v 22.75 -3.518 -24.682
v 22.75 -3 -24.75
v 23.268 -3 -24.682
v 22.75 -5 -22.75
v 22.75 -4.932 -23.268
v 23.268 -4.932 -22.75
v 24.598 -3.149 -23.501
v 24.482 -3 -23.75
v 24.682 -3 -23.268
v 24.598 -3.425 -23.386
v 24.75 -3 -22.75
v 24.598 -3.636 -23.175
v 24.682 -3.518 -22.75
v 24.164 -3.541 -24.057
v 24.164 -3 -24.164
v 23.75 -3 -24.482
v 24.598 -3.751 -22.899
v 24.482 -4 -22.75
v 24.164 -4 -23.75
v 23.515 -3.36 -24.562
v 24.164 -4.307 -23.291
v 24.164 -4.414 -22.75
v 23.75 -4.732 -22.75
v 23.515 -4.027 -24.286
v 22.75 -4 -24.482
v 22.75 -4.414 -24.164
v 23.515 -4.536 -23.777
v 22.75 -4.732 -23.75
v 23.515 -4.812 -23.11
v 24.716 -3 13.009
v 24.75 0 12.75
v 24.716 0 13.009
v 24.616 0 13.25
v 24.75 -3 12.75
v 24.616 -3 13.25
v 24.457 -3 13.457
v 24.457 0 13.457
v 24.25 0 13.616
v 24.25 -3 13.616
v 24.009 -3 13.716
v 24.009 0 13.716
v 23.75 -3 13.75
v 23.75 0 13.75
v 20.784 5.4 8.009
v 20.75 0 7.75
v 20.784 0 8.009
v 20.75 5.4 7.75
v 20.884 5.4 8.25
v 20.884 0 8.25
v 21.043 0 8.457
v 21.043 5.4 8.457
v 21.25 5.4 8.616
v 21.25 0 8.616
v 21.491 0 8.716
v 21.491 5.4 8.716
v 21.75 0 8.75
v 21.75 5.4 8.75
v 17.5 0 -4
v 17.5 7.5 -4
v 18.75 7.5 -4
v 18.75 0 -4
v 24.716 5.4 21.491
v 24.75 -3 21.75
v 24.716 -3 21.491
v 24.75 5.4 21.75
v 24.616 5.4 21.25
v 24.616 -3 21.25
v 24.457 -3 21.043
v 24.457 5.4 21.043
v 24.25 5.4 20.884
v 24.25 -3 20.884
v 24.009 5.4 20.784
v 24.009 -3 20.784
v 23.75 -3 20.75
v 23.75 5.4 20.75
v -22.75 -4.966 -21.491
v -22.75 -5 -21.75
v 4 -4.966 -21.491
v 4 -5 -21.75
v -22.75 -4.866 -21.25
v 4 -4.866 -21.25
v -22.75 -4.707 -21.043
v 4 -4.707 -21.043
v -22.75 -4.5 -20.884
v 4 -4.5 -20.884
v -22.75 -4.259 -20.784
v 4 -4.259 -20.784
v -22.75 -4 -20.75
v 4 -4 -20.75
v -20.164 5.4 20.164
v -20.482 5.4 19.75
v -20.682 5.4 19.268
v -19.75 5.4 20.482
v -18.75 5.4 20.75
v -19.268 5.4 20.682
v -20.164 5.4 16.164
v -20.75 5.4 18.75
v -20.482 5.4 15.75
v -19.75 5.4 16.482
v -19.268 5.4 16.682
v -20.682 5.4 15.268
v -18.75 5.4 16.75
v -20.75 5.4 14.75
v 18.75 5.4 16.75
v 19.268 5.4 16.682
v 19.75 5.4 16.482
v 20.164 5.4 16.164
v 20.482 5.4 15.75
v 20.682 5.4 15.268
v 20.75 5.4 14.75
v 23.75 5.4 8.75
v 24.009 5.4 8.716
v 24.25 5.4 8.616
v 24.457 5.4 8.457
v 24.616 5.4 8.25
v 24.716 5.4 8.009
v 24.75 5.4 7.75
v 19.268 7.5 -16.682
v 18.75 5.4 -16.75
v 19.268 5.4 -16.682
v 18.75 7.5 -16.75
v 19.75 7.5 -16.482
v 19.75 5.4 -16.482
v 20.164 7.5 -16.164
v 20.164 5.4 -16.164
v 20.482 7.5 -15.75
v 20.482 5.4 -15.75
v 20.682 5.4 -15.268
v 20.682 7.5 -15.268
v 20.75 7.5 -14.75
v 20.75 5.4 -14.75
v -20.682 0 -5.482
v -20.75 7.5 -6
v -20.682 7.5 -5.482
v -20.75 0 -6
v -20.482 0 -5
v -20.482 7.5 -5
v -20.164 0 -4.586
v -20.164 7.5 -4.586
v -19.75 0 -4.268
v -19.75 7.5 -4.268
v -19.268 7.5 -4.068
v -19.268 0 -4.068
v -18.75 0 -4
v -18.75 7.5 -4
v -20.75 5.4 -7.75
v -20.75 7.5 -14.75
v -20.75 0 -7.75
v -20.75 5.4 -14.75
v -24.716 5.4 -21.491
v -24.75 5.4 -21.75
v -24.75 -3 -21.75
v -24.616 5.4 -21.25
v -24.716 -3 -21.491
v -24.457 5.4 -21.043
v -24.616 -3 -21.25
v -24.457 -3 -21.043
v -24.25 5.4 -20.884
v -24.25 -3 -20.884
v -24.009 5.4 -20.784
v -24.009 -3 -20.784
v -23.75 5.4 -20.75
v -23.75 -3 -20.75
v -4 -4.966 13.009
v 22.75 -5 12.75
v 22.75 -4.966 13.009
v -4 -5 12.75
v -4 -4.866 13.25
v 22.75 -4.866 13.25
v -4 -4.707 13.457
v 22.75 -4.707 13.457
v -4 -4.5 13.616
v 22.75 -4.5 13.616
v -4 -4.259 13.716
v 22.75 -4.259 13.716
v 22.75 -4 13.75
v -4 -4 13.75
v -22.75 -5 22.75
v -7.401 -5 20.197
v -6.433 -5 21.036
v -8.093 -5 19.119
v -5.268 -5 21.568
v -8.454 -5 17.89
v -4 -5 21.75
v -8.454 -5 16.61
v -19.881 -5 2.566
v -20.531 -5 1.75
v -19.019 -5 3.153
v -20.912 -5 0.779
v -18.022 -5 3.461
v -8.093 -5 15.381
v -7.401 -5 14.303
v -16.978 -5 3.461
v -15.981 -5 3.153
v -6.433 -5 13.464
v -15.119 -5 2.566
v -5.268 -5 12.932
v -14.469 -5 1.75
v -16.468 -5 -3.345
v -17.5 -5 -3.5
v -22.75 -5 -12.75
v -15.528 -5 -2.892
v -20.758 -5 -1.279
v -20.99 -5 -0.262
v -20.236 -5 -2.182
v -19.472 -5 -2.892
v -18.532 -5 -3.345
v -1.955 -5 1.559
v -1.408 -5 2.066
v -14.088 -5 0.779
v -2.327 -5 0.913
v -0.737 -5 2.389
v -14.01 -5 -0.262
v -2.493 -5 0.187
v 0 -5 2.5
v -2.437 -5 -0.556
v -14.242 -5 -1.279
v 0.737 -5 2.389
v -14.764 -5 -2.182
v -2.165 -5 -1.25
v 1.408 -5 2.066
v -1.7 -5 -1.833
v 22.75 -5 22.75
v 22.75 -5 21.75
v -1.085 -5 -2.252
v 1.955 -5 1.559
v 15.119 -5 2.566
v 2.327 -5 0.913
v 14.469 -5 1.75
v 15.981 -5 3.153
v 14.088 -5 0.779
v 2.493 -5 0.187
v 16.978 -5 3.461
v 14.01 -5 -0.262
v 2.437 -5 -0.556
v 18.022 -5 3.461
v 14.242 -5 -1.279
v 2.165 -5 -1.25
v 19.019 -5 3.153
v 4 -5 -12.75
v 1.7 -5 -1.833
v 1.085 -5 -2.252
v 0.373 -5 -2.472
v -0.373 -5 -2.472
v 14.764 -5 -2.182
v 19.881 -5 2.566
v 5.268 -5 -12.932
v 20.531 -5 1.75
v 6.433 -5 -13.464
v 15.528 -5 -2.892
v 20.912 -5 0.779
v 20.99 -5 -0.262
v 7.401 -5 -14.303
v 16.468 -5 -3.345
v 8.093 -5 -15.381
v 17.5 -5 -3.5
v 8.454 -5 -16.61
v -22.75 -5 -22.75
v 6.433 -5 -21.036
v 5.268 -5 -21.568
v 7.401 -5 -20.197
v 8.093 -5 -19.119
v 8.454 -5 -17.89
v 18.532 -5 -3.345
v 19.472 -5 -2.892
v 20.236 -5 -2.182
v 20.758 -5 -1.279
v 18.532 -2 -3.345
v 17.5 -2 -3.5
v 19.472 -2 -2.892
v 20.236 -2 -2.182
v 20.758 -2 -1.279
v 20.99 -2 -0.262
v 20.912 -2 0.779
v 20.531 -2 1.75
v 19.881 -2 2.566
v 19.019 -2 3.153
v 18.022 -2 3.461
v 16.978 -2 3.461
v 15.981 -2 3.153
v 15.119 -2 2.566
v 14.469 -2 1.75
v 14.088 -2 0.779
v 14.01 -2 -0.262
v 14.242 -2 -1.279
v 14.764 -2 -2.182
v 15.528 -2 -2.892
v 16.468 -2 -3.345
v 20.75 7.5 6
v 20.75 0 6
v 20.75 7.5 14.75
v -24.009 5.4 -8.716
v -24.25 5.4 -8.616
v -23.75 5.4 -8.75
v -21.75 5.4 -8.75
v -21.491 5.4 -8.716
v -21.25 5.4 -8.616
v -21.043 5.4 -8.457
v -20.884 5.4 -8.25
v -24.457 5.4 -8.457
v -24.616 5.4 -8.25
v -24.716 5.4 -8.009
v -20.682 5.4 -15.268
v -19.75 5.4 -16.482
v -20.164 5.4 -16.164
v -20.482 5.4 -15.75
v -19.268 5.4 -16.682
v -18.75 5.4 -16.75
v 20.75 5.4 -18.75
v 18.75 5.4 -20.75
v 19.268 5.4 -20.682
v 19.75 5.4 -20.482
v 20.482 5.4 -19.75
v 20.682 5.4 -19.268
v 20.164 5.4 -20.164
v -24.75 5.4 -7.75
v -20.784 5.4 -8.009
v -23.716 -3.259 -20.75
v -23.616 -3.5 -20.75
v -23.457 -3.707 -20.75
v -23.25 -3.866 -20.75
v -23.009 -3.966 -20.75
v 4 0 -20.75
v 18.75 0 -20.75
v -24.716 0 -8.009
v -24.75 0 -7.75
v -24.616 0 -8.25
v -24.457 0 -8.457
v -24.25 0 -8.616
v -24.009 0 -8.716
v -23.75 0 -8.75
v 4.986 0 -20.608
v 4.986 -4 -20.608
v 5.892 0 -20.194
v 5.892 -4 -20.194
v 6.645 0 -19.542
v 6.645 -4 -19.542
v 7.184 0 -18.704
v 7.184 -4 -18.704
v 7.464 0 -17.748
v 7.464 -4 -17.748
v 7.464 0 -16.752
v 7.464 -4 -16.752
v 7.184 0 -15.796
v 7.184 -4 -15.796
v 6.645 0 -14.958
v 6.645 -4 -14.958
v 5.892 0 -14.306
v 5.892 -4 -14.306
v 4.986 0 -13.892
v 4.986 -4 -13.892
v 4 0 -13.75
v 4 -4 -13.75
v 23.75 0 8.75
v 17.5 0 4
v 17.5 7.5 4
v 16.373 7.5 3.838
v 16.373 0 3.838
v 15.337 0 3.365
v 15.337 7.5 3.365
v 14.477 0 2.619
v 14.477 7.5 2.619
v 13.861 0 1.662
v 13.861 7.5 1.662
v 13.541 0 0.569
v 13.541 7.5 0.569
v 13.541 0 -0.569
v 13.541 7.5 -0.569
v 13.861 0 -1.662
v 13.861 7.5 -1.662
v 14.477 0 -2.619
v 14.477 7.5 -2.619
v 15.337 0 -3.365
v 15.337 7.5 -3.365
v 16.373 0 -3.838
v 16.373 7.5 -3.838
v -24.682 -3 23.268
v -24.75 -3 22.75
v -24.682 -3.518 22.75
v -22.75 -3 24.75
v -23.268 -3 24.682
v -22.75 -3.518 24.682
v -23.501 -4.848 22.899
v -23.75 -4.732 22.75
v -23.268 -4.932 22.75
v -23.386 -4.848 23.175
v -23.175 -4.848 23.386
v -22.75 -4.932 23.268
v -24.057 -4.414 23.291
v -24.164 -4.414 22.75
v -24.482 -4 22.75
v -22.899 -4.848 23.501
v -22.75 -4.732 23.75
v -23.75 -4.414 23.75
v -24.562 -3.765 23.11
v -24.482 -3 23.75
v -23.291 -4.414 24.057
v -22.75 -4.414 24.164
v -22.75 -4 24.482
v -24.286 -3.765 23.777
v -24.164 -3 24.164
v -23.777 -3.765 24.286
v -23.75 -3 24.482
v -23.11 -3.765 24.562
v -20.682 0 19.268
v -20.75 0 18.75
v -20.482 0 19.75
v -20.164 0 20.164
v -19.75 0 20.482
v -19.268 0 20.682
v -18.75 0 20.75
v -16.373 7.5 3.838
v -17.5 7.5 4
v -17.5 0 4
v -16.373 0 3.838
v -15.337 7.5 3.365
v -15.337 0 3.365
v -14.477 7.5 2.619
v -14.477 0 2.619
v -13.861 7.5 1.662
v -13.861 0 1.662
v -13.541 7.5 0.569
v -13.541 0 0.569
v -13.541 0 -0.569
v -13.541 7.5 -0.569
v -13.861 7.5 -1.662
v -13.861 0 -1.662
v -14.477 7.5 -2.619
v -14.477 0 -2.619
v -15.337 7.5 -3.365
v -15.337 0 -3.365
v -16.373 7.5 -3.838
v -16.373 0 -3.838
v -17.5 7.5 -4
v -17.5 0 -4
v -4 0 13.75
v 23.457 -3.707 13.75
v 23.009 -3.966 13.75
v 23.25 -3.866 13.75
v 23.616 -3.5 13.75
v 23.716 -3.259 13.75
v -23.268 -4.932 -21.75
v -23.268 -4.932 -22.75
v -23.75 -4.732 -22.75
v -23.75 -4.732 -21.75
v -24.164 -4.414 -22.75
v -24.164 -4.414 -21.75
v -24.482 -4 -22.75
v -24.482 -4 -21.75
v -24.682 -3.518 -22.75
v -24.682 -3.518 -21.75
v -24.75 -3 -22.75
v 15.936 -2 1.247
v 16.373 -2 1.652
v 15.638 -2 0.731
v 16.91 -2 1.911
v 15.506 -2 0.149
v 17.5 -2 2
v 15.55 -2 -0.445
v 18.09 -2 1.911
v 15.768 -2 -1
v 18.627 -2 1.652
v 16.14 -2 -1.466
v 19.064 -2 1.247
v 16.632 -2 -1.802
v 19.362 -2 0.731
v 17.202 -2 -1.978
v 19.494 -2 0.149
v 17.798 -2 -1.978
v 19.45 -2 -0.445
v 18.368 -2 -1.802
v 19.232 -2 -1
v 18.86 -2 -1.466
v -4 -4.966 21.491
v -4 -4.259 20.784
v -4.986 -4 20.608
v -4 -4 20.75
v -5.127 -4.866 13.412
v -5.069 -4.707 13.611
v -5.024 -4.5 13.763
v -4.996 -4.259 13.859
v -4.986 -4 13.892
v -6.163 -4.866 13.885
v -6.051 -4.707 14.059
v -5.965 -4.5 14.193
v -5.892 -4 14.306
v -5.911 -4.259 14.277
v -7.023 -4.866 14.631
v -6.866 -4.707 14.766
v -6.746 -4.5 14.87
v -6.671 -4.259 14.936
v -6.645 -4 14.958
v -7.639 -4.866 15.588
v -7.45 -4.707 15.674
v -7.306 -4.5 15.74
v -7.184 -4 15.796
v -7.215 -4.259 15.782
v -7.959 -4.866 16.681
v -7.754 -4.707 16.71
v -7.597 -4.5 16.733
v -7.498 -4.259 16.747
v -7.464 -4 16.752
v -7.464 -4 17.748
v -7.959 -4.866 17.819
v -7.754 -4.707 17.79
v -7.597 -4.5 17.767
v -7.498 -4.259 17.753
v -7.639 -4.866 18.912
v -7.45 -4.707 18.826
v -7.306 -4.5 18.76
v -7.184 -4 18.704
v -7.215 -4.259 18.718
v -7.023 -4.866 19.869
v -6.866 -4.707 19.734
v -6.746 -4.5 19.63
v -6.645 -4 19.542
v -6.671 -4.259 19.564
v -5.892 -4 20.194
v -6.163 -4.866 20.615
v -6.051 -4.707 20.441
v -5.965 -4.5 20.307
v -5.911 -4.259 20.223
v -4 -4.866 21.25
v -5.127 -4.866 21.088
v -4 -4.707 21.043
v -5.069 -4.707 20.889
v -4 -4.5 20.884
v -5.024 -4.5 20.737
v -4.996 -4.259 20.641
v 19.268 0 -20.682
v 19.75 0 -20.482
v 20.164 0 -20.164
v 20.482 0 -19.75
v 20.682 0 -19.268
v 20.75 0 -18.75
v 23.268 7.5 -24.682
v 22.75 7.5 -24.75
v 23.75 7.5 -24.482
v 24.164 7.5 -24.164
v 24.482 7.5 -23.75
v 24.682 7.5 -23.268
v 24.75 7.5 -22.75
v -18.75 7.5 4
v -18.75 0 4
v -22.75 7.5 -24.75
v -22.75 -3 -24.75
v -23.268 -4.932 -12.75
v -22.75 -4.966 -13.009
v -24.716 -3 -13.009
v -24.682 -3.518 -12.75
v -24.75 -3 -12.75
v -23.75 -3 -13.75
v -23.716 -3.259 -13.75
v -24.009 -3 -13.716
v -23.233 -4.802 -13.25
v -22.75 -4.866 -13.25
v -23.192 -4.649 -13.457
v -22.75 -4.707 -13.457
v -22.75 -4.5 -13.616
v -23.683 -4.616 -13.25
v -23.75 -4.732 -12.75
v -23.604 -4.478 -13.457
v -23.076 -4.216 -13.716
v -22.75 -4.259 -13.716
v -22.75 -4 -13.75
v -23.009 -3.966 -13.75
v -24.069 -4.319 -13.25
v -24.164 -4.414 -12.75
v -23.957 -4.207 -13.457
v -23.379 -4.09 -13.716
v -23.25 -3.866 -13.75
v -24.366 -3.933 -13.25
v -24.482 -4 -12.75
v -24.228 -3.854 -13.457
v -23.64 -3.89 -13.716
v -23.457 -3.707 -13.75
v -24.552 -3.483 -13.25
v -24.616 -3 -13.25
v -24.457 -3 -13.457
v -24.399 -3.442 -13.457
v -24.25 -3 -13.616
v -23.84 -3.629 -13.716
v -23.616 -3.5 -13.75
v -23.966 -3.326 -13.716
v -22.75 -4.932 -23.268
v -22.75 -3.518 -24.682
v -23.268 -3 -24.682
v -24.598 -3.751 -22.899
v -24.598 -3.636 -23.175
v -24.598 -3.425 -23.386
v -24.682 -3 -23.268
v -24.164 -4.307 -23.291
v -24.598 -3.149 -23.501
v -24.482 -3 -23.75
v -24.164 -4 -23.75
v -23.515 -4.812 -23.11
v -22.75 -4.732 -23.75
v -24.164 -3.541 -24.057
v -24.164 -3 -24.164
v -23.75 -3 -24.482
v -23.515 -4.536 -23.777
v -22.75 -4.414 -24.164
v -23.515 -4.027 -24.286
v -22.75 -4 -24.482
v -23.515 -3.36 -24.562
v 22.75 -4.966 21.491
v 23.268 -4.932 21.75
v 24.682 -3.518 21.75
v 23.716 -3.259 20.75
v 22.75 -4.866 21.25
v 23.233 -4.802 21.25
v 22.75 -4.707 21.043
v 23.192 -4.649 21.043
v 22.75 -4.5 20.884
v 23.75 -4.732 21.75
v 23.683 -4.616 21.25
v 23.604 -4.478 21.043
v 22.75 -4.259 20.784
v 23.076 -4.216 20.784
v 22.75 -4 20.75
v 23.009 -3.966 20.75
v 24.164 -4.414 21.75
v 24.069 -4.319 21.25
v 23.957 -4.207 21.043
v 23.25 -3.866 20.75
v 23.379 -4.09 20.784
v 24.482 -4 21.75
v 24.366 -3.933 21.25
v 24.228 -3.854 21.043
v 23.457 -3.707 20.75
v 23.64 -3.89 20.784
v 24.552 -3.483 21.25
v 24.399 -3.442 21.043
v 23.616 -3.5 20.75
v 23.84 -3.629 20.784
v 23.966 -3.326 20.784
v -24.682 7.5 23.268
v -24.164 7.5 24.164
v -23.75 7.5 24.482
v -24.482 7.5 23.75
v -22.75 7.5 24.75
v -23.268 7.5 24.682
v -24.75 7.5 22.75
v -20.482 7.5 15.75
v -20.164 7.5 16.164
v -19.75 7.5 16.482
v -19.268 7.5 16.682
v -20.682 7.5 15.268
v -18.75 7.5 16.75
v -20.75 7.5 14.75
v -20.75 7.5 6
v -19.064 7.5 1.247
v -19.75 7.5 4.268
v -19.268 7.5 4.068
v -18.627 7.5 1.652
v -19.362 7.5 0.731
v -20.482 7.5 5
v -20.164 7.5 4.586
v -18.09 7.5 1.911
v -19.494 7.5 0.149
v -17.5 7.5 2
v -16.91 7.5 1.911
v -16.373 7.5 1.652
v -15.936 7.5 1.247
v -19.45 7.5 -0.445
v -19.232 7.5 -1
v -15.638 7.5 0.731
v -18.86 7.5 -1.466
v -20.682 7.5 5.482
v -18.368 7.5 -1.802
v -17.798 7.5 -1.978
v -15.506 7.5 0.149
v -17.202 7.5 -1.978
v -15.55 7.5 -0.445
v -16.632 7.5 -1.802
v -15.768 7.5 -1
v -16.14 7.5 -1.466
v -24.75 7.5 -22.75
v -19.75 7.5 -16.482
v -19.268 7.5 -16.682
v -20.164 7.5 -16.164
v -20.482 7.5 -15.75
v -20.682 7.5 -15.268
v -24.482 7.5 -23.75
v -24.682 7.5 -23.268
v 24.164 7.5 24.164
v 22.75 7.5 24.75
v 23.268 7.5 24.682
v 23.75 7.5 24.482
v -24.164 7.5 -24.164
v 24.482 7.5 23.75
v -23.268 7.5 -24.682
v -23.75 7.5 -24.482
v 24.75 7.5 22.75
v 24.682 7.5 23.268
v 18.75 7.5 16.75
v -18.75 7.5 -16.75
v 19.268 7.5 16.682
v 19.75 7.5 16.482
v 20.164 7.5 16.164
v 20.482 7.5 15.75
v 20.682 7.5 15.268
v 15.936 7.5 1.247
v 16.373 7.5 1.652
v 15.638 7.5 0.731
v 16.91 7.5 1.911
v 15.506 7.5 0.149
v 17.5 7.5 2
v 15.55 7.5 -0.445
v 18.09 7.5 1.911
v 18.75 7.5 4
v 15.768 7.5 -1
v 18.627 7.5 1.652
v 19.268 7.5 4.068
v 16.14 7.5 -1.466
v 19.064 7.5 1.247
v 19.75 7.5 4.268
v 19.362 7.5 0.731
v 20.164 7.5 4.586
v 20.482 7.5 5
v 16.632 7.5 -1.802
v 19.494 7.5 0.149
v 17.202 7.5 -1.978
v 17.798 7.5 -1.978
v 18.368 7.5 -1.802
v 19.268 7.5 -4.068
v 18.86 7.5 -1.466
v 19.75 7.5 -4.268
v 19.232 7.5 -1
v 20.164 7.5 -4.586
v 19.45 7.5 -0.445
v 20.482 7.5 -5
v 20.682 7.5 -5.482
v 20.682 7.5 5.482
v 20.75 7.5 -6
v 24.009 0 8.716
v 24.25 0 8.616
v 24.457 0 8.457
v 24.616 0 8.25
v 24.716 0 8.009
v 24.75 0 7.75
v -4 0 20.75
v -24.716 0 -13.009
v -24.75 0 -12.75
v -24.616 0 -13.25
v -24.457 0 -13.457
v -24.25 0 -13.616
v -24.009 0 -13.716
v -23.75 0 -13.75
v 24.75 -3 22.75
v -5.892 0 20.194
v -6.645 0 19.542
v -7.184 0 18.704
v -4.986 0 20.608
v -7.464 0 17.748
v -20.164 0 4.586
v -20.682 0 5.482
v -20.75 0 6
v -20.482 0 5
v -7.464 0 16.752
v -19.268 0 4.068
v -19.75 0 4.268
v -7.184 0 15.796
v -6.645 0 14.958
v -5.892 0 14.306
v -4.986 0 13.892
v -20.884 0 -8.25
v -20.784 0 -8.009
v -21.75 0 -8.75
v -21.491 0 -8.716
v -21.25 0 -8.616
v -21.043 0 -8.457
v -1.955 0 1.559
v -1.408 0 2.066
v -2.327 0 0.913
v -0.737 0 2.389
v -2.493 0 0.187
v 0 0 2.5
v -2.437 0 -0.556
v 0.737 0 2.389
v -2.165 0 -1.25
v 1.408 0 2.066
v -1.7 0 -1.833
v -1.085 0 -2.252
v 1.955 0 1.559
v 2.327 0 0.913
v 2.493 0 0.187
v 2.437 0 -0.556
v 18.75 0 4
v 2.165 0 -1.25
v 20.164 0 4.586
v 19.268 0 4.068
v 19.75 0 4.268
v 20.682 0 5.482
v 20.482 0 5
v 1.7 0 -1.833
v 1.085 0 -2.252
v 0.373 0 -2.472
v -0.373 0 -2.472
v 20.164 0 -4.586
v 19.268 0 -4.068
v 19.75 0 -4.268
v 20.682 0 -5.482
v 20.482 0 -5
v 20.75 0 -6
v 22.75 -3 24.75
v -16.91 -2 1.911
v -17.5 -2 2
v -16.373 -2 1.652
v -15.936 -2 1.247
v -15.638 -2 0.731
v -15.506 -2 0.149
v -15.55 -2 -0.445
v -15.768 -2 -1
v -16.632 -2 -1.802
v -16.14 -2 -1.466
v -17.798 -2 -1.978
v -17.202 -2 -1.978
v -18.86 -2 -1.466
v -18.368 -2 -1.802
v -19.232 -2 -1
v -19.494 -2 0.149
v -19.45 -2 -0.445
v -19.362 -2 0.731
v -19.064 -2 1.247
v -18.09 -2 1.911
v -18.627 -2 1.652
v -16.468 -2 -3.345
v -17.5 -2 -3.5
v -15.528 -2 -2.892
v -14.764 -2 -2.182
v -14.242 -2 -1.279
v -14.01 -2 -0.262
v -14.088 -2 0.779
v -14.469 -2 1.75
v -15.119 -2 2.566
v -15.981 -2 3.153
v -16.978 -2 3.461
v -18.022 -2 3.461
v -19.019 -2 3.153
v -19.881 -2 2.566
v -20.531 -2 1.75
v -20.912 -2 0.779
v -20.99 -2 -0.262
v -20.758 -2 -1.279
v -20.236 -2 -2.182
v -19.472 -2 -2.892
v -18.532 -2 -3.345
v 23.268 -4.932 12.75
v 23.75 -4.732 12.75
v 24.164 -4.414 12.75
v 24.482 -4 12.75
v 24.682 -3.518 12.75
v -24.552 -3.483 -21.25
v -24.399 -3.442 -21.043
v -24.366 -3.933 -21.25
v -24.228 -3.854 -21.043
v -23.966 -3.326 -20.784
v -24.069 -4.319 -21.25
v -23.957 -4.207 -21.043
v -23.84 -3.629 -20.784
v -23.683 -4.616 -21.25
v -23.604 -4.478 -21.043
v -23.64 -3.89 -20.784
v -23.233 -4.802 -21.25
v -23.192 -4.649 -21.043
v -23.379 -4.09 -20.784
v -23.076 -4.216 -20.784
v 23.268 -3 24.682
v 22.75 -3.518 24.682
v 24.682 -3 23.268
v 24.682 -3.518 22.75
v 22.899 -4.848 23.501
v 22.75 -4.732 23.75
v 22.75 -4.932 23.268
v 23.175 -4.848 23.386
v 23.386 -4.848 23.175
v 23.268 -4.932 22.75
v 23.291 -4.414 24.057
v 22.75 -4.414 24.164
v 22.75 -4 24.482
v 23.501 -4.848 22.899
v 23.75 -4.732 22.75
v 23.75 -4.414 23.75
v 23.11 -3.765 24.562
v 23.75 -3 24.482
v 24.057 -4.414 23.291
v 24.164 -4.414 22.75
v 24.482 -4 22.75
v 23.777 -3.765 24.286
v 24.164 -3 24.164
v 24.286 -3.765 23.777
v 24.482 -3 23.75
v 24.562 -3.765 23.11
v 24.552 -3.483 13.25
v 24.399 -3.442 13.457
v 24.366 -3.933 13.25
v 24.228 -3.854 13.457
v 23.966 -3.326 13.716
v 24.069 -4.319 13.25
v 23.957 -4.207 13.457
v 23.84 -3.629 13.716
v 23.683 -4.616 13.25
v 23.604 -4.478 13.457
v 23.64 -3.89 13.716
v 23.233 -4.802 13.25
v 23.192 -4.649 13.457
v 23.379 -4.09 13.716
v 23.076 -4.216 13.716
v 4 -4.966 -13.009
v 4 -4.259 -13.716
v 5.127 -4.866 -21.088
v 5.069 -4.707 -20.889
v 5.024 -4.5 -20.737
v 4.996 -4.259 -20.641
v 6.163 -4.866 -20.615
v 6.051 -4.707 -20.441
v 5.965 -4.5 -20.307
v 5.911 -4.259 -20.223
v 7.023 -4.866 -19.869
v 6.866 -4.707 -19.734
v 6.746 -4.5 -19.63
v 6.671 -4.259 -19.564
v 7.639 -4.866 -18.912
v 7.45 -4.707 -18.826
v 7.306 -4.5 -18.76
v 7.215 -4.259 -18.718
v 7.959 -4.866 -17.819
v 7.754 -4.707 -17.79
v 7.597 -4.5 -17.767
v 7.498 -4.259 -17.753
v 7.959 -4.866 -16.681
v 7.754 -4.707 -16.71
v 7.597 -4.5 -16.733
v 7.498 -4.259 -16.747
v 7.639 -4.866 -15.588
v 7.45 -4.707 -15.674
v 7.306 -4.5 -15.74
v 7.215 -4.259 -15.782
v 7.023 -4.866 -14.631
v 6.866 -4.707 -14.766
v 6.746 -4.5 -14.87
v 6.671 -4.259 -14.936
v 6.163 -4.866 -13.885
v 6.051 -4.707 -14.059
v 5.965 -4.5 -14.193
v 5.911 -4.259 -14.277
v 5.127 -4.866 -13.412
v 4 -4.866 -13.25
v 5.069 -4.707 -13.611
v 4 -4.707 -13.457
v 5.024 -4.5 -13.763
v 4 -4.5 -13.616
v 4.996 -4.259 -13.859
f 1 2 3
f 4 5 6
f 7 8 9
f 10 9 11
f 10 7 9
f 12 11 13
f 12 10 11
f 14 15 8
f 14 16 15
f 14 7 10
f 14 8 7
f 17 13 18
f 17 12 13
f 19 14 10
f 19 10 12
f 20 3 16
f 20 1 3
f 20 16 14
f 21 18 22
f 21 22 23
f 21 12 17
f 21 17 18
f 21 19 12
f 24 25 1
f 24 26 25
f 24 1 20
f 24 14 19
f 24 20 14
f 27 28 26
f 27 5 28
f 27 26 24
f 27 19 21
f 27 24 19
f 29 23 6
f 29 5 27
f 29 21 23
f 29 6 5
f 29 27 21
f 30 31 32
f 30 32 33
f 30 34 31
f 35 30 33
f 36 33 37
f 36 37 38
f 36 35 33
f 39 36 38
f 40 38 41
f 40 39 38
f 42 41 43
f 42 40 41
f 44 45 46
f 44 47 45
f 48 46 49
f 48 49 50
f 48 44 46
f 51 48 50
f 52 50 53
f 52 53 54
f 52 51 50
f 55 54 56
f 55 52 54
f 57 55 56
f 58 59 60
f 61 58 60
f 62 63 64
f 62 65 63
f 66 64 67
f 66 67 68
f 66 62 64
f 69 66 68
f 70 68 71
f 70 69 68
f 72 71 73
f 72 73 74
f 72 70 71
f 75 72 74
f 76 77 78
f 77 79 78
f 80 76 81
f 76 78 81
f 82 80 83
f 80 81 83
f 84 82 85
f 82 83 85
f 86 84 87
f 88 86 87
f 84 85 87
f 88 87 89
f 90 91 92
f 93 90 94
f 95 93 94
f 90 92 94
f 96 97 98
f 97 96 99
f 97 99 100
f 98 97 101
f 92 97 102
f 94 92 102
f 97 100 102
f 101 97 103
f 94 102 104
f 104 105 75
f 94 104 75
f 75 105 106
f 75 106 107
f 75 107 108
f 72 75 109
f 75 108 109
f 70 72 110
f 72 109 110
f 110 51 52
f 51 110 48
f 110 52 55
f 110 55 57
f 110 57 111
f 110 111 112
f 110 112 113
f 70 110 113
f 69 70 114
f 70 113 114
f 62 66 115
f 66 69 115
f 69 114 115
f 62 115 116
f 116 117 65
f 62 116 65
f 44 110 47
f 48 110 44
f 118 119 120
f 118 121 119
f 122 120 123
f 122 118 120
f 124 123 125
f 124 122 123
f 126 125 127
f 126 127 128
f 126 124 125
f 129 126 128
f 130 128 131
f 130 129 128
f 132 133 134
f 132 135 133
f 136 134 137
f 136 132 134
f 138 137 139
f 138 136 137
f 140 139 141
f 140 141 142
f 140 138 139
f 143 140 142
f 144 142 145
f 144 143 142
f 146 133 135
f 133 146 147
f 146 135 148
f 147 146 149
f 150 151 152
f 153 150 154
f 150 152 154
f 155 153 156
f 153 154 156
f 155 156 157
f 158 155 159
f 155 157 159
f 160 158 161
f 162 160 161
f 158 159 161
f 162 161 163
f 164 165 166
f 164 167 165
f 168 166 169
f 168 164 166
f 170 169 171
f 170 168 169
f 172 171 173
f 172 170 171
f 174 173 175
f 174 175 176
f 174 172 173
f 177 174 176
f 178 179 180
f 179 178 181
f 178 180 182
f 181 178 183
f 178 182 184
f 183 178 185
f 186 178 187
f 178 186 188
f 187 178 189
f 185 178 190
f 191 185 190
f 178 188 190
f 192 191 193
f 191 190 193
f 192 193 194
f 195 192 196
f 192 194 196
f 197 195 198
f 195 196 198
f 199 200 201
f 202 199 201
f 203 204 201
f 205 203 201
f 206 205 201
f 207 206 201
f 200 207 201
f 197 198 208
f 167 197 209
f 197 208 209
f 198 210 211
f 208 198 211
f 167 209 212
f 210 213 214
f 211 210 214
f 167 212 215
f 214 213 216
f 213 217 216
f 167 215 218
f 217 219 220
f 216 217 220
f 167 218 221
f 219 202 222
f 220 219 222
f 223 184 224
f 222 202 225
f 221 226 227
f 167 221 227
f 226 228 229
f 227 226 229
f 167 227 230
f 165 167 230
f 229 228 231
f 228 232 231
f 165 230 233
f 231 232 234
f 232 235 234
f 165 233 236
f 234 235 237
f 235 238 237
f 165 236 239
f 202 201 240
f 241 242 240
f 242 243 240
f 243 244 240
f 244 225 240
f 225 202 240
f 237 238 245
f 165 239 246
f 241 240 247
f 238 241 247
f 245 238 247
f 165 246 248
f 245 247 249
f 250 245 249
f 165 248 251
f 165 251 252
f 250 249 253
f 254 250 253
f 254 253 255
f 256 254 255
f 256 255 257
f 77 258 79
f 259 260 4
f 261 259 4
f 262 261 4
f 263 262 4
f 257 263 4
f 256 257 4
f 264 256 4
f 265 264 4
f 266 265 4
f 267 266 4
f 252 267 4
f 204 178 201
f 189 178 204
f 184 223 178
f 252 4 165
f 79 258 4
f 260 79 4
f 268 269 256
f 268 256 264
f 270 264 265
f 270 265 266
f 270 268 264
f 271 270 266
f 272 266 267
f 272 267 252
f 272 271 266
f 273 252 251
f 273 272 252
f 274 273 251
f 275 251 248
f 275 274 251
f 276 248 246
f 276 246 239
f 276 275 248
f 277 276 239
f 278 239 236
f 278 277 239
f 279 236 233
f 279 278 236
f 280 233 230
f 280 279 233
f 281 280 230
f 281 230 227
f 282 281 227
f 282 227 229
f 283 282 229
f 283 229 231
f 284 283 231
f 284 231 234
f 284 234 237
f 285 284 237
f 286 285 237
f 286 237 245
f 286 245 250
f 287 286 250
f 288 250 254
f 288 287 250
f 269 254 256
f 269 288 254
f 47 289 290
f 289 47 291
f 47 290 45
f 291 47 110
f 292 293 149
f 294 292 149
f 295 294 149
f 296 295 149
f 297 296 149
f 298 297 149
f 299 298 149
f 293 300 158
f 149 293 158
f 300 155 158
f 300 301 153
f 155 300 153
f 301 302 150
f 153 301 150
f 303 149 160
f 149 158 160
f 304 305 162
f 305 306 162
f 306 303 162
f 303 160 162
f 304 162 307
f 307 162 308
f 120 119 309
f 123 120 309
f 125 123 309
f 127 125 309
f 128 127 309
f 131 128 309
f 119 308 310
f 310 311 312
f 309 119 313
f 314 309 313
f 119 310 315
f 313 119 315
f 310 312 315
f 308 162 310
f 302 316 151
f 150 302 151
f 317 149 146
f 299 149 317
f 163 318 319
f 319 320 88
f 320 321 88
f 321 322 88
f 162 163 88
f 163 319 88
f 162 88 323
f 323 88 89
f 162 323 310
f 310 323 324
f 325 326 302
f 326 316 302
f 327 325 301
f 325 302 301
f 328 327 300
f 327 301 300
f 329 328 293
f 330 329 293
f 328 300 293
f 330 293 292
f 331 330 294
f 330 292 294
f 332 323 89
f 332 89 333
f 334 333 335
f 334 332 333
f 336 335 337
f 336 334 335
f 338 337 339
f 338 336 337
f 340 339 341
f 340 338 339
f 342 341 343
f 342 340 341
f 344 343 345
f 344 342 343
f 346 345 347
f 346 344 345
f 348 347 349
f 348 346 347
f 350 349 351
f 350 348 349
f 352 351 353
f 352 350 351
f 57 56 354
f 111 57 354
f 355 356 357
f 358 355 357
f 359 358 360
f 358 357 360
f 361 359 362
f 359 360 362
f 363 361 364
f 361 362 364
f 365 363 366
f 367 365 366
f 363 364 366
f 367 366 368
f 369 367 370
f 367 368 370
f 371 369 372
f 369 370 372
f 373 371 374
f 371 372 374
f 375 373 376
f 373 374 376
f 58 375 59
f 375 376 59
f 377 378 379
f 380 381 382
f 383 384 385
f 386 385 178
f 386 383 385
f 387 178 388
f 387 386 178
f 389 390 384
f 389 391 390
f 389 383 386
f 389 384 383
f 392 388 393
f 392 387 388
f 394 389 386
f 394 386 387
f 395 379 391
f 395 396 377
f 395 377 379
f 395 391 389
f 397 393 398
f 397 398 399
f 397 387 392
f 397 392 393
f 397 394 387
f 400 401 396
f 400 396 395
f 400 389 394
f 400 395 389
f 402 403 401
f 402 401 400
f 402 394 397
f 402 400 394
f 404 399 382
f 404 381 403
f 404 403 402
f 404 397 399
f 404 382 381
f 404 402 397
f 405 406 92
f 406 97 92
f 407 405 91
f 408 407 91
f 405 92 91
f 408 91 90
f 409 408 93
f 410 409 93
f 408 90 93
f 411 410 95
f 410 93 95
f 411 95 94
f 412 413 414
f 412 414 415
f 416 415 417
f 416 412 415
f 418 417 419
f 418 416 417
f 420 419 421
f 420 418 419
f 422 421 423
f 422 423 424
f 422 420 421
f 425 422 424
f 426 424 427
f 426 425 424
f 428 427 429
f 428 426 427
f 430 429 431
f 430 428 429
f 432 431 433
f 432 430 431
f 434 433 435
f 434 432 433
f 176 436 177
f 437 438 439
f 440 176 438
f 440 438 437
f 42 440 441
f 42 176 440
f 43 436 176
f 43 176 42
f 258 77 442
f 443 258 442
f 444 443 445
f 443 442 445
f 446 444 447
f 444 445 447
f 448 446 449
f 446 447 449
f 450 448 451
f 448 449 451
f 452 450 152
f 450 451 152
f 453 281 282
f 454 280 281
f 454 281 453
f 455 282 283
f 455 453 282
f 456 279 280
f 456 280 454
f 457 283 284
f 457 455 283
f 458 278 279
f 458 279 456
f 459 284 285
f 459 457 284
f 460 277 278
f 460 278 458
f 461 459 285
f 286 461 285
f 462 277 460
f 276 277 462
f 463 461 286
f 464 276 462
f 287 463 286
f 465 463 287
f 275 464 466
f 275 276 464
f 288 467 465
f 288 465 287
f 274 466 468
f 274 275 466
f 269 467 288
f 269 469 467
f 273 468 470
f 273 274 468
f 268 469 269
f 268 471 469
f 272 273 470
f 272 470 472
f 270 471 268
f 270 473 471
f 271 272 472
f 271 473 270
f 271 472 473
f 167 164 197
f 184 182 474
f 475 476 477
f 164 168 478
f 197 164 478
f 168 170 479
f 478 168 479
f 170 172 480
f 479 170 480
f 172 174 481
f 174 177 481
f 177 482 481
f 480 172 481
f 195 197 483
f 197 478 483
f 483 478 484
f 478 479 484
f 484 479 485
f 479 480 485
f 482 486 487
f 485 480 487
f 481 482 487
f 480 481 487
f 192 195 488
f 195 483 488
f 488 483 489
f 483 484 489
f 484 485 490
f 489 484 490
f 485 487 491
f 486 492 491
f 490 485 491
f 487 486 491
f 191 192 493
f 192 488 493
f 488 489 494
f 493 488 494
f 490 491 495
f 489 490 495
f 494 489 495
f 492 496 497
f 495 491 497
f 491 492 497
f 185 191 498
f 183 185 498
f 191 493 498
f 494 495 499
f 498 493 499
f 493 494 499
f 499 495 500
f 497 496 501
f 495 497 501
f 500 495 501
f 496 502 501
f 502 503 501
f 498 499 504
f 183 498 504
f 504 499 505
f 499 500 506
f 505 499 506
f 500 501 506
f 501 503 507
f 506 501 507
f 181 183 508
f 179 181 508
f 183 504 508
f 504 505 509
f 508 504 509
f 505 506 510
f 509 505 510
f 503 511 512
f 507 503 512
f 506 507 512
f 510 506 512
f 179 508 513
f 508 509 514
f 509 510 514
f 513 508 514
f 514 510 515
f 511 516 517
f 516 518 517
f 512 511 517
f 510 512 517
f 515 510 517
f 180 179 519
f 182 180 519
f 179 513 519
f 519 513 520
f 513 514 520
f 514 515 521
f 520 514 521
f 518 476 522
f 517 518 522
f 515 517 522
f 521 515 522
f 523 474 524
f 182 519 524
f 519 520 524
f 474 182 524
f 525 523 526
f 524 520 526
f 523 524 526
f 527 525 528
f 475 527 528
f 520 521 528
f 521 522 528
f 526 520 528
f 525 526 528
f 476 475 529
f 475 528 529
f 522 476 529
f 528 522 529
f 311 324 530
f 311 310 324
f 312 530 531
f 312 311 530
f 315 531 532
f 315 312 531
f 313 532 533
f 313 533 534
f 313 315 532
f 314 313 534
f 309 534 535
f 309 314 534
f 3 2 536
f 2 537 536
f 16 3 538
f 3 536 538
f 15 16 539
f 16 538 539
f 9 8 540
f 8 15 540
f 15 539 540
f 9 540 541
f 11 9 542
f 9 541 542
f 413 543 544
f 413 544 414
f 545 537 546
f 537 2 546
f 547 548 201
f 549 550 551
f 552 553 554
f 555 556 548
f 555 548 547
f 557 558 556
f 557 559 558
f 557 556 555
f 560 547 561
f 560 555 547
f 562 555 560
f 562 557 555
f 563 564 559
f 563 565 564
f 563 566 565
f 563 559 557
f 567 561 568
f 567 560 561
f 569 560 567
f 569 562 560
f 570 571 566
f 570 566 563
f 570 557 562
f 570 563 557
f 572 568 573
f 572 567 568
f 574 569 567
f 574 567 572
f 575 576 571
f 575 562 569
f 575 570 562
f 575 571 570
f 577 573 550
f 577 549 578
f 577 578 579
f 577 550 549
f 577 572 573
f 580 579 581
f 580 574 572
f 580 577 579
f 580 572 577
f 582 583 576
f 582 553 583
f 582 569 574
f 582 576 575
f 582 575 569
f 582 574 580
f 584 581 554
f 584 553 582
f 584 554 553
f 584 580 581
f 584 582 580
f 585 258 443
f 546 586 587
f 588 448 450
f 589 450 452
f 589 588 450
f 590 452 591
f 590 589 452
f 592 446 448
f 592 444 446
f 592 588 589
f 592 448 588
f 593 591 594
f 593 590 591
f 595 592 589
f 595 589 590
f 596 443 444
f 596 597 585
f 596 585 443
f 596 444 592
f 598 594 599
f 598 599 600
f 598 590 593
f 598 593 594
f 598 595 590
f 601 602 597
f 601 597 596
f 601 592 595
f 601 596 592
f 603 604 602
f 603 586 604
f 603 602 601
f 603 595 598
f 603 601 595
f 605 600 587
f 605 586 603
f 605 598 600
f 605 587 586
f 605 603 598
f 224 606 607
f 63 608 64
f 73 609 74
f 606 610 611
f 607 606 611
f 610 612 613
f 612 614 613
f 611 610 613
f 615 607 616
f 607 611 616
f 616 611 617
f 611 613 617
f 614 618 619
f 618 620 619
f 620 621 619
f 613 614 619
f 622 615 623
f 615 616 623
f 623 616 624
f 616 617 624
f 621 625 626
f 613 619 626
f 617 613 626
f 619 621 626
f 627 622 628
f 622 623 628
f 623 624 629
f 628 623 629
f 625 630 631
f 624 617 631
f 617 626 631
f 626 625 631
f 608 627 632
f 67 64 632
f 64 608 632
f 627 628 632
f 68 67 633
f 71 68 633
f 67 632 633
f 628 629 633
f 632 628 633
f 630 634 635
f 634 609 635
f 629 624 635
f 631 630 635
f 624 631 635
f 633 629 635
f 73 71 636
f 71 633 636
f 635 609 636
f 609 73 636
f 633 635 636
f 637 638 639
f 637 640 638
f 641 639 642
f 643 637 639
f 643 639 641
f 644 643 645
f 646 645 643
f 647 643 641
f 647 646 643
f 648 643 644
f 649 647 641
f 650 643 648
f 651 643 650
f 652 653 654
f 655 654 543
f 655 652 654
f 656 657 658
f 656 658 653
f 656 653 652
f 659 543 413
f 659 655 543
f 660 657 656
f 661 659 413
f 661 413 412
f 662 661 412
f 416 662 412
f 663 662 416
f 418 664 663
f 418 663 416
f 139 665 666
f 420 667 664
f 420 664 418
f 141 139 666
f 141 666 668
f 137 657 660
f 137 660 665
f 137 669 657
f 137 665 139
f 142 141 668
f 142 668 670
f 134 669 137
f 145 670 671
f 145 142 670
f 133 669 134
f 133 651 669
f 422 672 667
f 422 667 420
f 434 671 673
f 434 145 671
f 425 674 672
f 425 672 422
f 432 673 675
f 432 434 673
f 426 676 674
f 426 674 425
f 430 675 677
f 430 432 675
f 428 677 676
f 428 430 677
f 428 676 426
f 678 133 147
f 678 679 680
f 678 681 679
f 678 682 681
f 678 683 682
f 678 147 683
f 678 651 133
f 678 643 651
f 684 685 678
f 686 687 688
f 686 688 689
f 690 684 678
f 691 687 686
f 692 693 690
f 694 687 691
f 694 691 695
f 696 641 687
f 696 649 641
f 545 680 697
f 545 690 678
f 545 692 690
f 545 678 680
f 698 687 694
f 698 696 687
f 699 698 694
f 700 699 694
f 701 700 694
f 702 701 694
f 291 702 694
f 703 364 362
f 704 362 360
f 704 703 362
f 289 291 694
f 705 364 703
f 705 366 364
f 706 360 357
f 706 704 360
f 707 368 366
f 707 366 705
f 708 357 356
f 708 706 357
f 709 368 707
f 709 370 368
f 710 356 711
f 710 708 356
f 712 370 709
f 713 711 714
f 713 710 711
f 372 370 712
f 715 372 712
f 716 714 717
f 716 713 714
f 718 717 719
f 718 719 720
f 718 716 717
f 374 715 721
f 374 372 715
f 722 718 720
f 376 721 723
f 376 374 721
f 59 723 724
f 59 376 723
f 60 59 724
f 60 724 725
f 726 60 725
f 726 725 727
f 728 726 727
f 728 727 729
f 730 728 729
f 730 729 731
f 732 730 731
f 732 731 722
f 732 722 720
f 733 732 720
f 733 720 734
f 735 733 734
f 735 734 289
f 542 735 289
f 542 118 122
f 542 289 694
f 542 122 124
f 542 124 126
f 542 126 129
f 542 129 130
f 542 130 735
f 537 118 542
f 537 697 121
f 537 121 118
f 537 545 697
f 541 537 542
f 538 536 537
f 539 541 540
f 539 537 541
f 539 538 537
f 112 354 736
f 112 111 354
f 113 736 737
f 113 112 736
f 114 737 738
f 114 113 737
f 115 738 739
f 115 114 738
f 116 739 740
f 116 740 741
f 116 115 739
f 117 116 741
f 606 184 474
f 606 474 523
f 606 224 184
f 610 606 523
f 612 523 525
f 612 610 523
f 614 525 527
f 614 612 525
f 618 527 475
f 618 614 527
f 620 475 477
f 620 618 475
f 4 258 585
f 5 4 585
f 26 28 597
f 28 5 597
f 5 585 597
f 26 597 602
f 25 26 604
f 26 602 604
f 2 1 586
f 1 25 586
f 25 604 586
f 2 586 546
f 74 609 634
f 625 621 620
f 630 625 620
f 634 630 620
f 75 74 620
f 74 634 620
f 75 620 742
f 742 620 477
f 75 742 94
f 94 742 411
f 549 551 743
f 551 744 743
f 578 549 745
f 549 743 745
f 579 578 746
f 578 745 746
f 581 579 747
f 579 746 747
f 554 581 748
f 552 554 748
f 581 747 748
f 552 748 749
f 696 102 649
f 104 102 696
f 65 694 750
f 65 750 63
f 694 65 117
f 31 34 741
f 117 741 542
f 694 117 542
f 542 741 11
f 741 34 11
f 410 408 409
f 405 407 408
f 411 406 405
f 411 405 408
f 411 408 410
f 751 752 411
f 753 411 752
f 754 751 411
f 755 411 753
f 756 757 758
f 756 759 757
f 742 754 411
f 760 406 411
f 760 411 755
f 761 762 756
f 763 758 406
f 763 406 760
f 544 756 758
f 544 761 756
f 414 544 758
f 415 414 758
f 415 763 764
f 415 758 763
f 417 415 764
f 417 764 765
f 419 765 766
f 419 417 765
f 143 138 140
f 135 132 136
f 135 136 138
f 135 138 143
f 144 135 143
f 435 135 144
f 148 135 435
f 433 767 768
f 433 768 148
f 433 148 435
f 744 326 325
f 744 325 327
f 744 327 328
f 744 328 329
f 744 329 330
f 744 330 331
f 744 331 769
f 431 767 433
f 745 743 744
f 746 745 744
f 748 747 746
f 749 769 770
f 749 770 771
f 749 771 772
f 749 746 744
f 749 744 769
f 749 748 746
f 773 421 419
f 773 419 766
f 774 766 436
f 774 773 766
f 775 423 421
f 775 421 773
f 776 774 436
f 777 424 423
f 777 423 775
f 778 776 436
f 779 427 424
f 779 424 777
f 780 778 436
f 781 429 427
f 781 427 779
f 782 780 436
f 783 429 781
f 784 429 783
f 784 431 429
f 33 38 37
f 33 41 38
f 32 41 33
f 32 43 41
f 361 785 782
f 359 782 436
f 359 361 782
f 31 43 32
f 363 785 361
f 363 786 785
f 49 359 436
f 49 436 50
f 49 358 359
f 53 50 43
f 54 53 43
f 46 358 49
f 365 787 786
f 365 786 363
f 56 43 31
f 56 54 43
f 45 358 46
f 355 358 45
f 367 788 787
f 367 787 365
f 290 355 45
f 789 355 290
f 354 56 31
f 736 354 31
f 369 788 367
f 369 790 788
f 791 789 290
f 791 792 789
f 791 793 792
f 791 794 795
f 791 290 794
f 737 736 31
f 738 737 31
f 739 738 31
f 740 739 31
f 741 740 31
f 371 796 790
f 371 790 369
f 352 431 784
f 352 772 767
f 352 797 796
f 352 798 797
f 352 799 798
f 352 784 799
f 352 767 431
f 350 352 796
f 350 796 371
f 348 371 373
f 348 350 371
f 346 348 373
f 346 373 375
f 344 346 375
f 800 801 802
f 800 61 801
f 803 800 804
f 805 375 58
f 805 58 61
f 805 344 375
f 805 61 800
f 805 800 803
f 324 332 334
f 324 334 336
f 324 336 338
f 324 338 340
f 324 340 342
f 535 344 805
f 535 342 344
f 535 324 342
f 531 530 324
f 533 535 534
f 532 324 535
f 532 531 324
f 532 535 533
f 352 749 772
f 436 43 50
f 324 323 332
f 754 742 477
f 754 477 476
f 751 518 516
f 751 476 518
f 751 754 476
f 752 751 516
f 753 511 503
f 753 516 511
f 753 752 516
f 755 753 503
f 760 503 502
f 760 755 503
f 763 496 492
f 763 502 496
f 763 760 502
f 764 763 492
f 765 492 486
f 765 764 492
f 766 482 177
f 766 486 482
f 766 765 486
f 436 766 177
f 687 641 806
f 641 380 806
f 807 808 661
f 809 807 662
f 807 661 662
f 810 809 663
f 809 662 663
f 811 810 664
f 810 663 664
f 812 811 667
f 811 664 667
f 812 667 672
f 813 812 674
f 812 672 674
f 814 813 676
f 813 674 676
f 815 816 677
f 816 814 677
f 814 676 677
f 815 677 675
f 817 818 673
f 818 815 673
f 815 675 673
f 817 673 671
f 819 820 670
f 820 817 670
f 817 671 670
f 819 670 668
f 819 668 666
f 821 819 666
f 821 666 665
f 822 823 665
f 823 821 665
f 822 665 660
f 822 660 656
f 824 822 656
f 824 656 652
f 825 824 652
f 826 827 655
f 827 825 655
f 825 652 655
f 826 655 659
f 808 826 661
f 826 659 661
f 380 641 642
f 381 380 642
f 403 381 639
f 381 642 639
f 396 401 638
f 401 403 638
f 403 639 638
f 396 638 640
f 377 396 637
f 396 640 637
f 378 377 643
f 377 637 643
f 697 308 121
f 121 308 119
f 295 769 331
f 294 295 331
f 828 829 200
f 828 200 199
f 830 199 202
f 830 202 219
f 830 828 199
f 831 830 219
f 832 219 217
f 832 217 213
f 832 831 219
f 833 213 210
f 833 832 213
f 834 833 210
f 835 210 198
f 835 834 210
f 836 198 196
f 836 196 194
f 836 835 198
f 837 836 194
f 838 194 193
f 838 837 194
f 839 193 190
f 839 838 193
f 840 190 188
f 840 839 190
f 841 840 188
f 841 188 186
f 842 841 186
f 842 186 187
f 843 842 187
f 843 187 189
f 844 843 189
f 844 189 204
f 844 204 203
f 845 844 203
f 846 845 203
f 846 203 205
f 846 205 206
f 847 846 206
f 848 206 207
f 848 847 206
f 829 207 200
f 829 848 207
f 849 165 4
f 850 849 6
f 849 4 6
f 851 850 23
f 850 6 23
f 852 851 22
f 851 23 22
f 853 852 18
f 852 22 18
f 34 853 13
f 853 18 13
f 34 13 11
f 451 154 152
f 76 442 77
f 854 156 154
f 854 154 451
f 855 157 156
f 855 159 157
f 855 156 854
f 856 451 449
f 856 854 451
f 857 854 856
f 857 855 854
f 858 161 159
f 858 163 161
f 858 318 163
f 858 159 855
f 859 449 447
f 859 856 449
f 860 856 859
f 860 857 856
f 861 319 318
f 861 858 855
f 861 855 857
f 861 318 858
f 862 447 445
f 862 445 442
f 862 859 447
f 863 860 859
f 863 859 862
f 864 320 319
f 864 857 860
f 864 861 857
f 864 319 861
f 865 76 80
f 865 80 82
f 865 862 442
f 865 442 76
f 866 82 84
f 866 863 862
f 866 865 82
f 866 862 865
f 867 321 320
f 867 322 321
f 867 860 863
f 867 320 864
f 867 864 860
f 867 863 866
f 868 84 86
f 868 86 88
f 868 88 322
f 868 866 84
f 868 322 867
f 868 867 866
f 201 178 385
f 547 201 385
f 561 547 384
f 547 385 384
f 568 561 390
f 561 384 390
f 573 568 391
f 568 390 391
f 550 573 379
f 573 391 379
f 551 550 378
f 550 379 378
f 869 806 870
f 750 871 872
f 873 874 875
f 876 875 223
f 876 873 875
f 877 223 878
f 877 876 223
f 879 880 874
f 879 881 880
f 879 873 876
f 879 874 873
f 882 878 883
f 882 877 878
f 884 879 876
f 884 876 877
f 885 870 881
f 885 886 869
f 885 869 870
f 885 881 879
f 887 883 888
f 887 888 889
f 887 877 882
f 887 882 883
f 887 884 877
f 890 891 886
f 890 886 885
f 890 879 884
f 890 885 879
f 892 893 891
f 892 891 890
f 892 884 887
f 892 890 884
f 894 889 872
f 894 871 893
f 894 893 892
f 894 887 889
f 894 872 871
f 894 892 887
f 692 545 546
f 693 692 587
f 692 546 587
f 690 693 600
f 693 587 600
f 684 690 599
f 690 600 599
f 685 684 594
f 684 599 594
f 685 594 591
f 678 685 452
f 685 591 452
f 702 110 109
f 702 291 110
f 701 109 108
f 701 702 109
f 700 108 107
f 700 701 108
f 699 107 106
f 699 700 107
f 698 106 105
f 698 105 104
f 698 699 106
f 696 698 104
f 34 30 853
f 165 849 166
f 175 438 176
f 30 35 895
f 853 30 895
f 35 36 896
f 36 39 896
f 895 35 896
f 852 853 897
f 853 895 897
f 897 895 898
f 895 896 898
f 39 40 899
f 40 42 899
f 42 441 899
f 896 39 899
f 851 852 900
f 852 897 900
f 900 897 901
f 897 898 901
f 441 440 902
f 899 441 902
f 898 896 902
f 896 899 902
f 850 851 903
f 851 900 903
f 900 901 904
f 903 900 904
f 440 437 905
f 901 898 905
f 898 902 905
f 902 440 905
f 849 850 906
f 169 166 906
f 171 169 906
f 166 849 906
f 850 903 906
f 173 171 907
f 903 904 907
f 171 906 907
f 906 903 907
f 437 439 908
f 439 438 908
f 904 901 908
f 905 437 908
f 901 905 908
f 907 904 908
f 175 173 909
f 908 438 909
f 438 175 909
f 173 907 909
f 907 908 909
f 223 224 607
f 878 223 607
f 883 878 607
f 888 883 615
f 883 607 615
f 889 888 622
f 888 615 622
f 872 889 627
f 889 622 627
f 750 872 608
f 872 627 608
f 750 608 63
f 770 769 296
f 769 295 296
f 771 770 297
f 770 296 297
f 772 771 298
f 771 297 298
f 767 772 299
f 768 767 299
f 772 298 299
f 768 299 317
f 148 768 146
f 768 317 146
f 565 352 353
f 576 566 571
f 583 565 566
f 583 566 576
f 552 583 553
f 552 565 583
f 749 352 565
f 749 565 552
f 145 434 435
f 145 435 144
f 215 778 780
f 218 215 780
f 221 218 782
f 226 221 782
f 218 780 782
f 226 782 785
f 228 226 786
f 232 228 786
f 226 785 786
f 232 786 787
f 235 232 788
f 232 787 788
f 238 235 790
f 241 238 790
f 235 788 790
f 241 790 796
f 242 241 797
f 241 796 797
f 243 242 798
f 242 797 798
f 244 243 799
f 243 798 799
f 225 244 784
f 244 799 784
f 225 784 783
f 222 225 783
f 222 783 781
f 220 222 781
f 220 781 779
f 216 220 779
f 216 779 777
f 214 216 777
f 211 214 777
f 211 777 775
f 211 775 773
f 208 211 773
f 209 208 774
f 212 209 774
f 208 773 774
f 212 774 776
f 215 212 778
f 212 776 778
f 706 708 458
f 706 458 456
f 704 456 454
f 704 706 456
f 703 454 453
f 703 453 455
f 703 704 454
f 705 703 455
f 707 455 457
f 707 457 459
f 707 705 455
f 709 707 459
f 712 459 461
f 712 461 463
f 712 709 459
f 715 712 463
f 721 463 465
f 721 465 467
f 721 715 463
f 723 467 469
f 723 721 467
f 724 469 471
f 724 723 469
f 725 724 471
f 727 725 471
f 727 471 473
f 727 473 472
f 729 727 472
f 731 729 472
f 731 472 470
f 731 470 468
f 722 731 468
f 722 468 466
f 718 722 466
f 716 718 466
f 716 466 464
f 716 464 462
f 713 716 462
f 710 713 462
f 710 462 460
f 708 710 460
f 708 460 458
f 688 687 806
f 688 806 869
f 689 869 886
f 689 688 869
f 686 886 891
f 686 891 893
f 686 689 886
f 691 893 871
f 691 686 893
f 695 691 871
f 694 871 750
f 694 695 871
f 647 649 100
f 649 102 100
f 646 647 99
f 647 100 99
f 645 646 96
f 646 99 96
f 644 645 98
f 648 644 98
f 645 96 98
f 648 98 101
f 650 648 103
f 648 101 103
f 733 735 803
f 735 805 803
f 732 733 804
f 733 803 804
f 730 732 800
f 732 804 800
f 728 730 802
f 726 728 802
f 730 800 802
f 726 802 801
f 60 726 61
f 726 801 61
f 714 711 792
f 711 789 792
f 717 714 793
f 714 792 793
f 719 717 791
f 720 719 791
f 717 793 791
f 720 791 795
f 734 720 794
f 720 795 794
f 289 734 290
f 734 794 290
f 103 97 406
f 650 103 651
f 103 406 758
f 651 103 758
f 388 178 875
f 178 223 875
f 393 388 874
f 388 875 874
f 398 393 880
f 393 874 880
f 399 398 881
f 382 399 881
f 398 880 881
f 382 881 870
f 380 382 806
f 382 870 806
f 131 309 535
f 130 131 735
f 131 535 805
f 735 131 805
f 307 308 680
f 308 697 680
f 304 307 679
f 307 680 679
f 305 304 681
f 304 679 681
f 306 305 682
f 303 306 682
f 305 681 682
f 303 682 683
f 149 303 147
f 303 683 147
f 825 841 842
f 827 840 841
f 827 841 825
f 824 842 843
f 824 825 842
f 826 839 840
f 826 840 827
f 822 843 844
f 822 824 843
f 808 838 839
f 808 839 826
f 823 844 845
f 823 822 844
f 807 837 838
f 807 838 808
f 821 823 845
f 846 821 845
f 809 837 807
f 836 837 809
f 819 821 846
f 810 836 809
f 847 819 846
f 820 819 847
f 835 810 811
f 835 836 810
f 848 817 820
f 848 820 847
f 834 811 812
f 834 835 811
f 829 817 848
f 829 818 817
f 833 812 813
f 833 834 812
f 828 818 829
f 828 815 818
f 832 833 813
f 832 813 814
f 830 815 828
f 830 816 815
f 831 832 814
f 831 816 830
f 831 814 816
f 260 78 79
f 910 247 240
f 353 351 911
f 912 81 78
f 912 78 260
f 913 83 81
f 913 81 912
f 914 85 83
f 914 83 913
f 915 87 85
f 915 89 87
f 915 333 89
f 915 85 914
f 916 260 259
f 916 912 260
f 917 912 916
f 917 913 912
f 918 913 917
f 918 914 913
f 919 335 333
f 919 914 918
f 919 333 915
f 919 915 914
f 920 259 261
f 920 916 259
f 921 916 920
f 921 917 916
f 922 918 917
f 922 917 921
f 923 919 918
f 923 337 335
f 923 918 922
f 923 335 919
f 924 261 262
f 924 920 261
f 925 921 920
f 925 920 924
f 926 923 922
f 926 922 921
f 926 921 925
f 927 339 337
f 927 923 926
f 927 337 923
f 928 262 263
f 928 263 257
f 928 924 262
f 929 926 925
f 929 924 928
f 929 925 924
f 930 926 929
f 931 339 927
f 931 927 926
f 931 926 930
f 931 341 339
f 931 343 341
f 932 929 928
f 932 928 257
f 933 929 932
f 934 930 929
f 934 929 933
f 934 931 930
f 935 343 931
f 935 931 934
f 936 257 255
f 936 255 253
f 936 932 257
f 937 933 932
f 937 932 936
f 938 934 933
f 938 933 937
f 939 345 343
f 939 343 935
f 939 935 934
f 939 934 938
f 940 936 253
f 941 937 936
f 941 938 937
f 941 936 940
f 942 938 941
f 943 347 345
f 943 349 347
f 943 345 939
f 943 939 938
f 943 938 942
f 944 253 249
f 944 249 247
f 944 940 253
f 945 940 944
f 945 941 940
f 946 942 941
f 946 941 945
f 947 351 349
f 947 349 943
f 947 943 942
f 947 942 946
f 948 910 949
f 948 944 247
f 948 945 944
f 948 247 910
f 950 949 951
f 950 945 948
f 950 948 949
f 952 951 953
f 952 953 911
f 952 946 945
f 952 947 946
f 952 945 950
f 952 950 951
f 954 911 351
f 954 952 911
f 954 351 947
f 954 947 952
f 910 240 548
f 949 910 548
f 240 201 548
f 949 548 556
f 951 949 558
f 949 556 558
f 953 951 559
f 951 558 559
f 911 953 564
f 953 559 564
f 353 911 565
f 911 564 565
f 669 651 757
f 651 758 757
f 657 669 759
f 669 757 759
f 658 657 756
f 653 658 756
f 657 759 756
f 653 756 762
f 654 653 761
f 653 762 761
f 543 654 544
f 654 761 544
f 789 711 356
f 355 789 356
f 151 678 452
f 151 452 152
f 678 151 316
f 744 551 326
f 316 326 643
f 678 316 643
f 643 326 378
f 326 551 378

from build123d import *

# Parameters (mm, degrees)
CROQUIS1_R                   = 2.5
SALIENTE_EXTRUIR1_DEPTH      = 5
SALIENTE_EXTRUIR2_DEPTH      = 5.5
SALIENTE_EXTRUIR5_DEPTH      = 2
SALIENTE_EXTRUIR5_DEPTH_BACK = 0.1
CROQUIS2_W                   = 41.5
CROQUIS2_H                   = 8
CROQUIS2_H_2                 = 4
CROQUIS2_W_2                 = 4
CROQUIS3_R                   = 2
SALIENTE_EXTRUIR6_DEPTH      = 7.5
CORTAR_EXTRUIR1_REACH        = 39.167
CROQUIS3_3_R                 = 2
CORTAR_EXTRUIR2_START        = -3
CROQUIS4_R                   = 3.5
CROQUIS4_R_2                 = 2
CORTAR_EXTRUIR2_DEPTH        = 3
REDONDEO1_R                  = 2
REDONDEO4_R                  = 2
REDONDEO3_R                  = 1


with BuildPart() as part:
    # Croquis1 → Saliente-Extruir1 (new body)
    with BuildSketch(Plane(origin=(0, 0, 0), x_dir=(1, 0, 0), z_dir=(0, 1, 0))):
        with BuildLine():
            Line((-24.75, -24.75), (24.75, -24.75))
            Line((24.75, -24.75), (24.75, -20.75))
            Line((24.75, -20.75), (-4, -20.75))
            ThreePointArc((-4, -20.75), (-7.5, -17.25), (-4, -13.75))
            Line((-4, -13.75), (24.75, -13.75))
            Line((24.75, -13.75), (24.75, 24.75))
            Line((24.75, 24.75), (-24.75, 24.75))
            Line((-24.75, 24.75), (-24.75, 20.75))
            Line((-24.75, 20.75), (4, 20.75))
            ThreePointArc((4, 20.75), (7.5, 17.25), (4, 13.75))
            Line((4, 13.75), (-24.75, 13.75))
            Line((-24.75, 13.75), (-24.75, -24.75))
        make_face()
        with Locations(Location((0, 0, 0), (0, 0, 270))):
            Circle(CROQUIS1_R, mode=Mode.SUBTRACT)
    extrude(amount=-SALIENTE_EXTRUIR1_DEPTH)

    # Croquis1<3> → Saliente-Extruir2 (add)
    with BuildSketch(Plane(origin=(0, 0, 0), x_dir=(1, 0, 0), z_dir=(0, 1, 0))):
        Polygon((-24.75, 8.75), (-24.75, -24.75), (24.75, -24.75), (24.75, -20.75), (-4, -20.75), (-20.75, -20.75), (-20.75, 8.75), align=None)
        Polygon((-24.75, 24.75), (-24.75, 20.75), (4, 20.75), (20.75, 20.75), (20.75, -8.75), (24.75, -8.75), (24.75, 24.75), align=None)
    extrude(amount=SALIENTE_EXTRUIR2_DEPTH)

    # Croquis2 → Saliente-Extruir5 (add, two sides: drawn at the far end of the back side and taken through both)
    with BuildSketch(Plane(origin=(0, 5.5, 0), x_dir=(1, 0, 0), z_dir=(0, 1, 0)).offset(-SALIENTE_EXTRUIR5_DEPTH_BACK)):
        with Locations((0, 20.75)):
            Rectangle(CROQUIS2_W, CROQUIS2_H)
        Polygon((-20.75, 24.75), (-24.75, 24.75), (-24.75, 8.75), (-20.75, 8.75), (-20.75, 16.75), align=None)
        with Locations((0, -18.75)):
            Rectangle(CROQUIS2_W, CROQUIS2_H_2)
        with Locations((0, -22.75)):
            Rectangle(CROQUIS2_W, CROQUIS2_H_2)
        Polygon((-20.75, 8.75), (-24.75, 8.75), (-24.75, -24.75), (-20.75, -24.75), (-20.75, -20.75), (-20.75, -16.75), align=None)
        Polygon((24.75, 24.75), (20.75, 24.75), (20.75, 16.75), (20.75, -16.75), (20.75, -20.75), (24.75, -20.75), align=None)
        with Locations((22.75, -22.75)):
            Rectangle(CROQUIS2_W_2, CROQUIS2_H_2)
    extrude(amount=SALIENTE_EXTRUIR5_DEPTH + SALIENTE_EXTRUIR5_DEPTH_BACK)

    # Croquis3 → Saliente-Extruir6 (add)
    with BuildSketch(Plane(origin=(0, 7.5, 0), x_dir=(1, 0, 0), z_dir=(0, 1, 0))):
        with BuildLine():
            Line((-20.75, 4), (-20.75, -4))
            Line((-20.75, -4), (-17.5, -4))
            ThreePointArc((-17.5, -4), (-13.5, 0), (-17.5, 4))
            Line((-17.5, 4), (-20.75, 4))
        make_face()
        with Locations(Location((-17.5, 0, 0), (0, 0, 270))):
            Circle(CROQUIS3_R, mode=Mode.SUBTRACT)
    saliente_extruir6 = extrude(amount=-SALIENTE_EXTRUIR6_DEPTH)

    # Croquis3<3> → Cortar-Extruir1 (cut, up to next)
    with BuildSketch(Plane(origin=(0, 7.5, 0), x_dir=(1, 0, 0), z_dir=(0, 1, 0)), mode=Mode.PRIVATE) as cortar_extruir1_sk1:
        with Locations(Location((-17.5, 0, 0), (0, 0, 270))):
            Circle(CROQUIS3_3_R)
    cortar_extruir1_tool1 = extrude(cortar_extruir1_sk1.sketch, amount=-CORTAR_EXTRUIR1_REACH, mode=Mode.PRIVATE) & part.part
    cortar_extruir1 = cortar_extruir1_tool1.solids().sort_by_distance((-17.5, 7.5, 0))[0]
    add(cortar_extruir1, mode=Mode.SUBTRACT)

    # Simetría1: Saliente-Extruir6, Cortar-Extruir1 across plane
    add(saliente_extruir6.mirror(Plane(origin=(0, 0, 0), x_dir=(0, 0, 1), z_dir=(1, 0, 0))))
    add(cortar_extruir1.mirror(Plane(origin=(0, 0, 0), x_dir=(0, 0, 1), z_dir=(1, 0, 0))), mode=Mode.SUBTRACT)

    # Croquis4 → Cortar-Extruir2 (cut)
    # profile 1 of 2: a face of its own
    with BuildSketch(Plane.XZ.offset(5).offset(CORTAR_EXTRUIR2_START)):
        with Locations(Location((-17.5, 0, 0), (0, 0, 270))):
            Circle(CROQUIS4_R)
        with Locations(Location((-17.5, 0, 0), (0, 0, 90))):
            Circle(CROQUIS4_R_2, mode=Mode.SUBTRACT)
    # profile 2 of 2: a face of its own
    with BuildSketch(Plane.XZ.offset(5).offset(CORTAR_EXTRUIR2_START)):
        with Locations(Location((17.5, 0, 0), (0, 0, 270))):
            Circle(CROQUIS4_R)
        with Locations(Location((17.5, 0, 0), (0, 0, 90))):
            Circle(CROQUIS4_R_2, mode=Mode.SUBTRACT)
    extrude(amount=CORTAR_EXTRUIR2_DEPTH, mode=Mode.SUBTRACT)

    # Redondeo1
    redondeo1_edges = [part.edges().sort_by_distance(p)[0] for p in [
        (20.75, 6.45, 16.75),
        (-20.75, 6.45, 16.75),
        (20.75, 6.45, -16.75),
        (-20.75, 3.75, -4),
        (-20.75, 3.75, 4),
        (20.75, 3.75, 4),
        (20.75, 3.75, -4),
        (-20.75, 6.45, -16.75),
    ]]
    fillet(redondeo1_edges, radius=REDONDEO1_R)

    # Redondeo4
    redondeo4_edges = [part.edges().sort_by_distance(p)[0] for p in [
        (0, -5, -24.75),
        (-24.75, -5, -22.75),
        (24.75, 1.25, 24.75),
        (-24.75, 1.25, 24.75),
        (-24.75, 1.25, -24.75),
        (24.75, 1.25, -24.75),
        (-24.75, -5, 5.5),
        (0, -5, 24.75),
        (24.75, -5, 22.75),
        (24.75, -5, -5.5),
        (20.75, 2.7, -20.75),
        (-20.75, 2.7, 20.75),
    ]]
    fillet(redondeo4_edges, radius=REDONDEO4_R)

    # Redondeo3
    redondeo3_edges = [part.edges().sort_by_distance(p)[0] for p in [
        (7.5, -5, -17.25),
        (24.75, 1.2, 20.75),
        (24.75, -1.5, 13.75),
        (9.375, -5, 13.75),
        (9.375, -5, 20.75),
        (-9.375, -5, -13.75),
        (-9.375, -5, -20.75),
        (24.164213562, -4.414213562, 13.75),
        (24.164213562, -4.414213562, 20.75),
        (-24.75, -1.5, -13.75),
        (-24.164213562, -4.414213562, -13.75),
        (-24.75, 1.2, -20.75),
        (-24.164213562, -4.414213562, -20.75),
        (-7.5, -5, 17.25),
        (24.75, 2.7, 8.75),
        (20.75, 2.7, 8.75),
        (-24.75, 2.7, -8.75),
        (-20.75, 2.7, -8.75),
    ]]
    fillet(redondeo3_edges, radius=REDONDEO3_R)


solid = part.part
